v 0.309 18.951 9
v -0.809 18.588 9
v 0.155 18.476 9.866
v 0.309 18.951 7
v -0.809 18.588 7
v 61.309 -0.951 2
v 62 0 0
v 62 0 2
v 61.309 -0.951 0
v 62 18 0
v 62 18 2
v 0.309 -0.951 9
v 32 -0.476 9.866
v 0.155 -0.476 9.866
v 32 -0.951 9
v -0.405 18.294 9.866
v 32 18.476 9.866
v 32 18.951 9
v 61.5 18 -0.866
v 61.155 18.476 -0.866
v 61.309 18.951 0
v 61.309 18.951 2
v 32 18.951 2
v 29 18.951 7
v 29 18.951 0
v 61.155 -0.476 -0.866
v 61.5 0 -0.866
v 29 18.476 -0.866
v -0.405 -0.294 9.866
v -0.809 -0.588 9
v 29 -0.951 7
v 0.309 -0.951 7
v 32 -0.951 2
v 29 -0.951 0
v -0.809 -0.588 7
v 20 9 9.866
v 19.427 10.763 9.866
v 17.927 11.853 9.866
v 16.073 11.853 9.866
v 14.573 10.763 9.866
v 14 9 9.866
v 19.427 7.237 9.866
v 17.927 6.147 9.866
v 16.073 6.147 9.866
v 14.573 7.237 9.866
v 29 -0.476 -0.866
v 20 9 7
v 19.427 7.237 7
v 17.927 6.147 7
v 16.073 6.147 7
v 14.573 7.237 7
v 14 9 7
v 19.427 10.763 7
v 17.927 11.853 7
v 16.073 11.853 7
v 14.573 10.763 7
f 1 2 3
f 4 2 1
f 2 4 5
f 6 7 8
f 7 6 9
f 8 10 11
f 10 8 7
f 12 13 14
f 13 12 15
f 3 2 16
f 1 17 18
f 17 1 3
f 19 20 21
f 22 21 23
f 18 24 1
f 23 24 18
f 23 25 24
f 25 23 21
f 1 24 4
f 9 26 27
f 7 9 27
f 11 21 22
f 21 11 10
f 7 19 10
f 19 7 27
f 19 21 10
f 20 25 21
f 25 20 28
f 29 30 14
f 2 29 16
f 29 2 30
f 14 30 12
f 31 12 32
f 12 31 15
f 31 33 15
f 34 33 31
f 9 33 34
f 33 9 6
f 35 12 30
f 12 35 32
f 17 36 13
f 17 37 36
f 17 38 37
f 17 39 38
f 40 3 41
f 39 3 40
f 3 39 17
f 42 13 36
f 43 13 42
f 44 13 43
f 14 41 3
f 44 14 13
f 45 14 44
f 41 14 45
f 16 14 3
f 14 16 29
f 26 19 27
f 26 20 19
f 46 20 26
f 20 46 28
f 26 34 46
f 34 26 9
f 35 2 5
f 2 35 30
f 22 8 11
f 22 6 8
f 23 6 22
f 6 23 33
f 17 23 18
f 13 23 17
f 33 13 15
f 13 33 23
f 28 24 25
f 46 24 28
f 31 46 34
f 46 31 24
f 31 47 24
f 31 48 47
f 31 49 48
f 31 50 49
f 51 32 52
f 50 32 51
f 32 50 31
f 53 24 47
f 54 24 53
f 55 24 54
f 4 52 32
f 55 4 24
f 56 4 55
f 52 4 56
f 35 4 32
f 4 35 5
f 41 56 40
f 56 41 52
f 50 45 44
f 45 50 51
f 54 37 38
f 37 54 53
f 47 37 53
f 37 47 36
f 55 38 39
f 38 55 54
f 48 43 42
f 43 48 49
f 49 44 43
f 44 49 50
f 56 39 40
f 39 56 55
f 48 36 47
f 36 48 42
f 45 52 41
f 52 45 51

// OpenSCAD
// @pabile 20180510
// Z bracket openscad parametric customizeable customizer

thick = 3;
width = 20;
armheight = 30;
armdepth = 5;

screwhole = 3;

difference() {
    minkowski(){
        cube (size = [((armheight*2)+thick)-2,width-2,((thick*2)+armdepth)-2]);
        sphere(1);
    }
     

    // top: the one that holds your thing
    # translate ([armheight+thick-1,-1,thick-1]) {
        cube (size = [armheight,width,armdepth+thick]);
    }
	
    // bottom: the one that mounts to the wall. has screw holes.
    # translate ([-1,-1,-1]) {
        cube (size = [armheight,width,armdepth+thick]);
	}
    
    // screw hole
    # translate ([(armheight/2)+2,(width/2)-1,armdepth]) {
        cylinder (armdepth*5,screwhole,screwhole,center=true);
    }

}
